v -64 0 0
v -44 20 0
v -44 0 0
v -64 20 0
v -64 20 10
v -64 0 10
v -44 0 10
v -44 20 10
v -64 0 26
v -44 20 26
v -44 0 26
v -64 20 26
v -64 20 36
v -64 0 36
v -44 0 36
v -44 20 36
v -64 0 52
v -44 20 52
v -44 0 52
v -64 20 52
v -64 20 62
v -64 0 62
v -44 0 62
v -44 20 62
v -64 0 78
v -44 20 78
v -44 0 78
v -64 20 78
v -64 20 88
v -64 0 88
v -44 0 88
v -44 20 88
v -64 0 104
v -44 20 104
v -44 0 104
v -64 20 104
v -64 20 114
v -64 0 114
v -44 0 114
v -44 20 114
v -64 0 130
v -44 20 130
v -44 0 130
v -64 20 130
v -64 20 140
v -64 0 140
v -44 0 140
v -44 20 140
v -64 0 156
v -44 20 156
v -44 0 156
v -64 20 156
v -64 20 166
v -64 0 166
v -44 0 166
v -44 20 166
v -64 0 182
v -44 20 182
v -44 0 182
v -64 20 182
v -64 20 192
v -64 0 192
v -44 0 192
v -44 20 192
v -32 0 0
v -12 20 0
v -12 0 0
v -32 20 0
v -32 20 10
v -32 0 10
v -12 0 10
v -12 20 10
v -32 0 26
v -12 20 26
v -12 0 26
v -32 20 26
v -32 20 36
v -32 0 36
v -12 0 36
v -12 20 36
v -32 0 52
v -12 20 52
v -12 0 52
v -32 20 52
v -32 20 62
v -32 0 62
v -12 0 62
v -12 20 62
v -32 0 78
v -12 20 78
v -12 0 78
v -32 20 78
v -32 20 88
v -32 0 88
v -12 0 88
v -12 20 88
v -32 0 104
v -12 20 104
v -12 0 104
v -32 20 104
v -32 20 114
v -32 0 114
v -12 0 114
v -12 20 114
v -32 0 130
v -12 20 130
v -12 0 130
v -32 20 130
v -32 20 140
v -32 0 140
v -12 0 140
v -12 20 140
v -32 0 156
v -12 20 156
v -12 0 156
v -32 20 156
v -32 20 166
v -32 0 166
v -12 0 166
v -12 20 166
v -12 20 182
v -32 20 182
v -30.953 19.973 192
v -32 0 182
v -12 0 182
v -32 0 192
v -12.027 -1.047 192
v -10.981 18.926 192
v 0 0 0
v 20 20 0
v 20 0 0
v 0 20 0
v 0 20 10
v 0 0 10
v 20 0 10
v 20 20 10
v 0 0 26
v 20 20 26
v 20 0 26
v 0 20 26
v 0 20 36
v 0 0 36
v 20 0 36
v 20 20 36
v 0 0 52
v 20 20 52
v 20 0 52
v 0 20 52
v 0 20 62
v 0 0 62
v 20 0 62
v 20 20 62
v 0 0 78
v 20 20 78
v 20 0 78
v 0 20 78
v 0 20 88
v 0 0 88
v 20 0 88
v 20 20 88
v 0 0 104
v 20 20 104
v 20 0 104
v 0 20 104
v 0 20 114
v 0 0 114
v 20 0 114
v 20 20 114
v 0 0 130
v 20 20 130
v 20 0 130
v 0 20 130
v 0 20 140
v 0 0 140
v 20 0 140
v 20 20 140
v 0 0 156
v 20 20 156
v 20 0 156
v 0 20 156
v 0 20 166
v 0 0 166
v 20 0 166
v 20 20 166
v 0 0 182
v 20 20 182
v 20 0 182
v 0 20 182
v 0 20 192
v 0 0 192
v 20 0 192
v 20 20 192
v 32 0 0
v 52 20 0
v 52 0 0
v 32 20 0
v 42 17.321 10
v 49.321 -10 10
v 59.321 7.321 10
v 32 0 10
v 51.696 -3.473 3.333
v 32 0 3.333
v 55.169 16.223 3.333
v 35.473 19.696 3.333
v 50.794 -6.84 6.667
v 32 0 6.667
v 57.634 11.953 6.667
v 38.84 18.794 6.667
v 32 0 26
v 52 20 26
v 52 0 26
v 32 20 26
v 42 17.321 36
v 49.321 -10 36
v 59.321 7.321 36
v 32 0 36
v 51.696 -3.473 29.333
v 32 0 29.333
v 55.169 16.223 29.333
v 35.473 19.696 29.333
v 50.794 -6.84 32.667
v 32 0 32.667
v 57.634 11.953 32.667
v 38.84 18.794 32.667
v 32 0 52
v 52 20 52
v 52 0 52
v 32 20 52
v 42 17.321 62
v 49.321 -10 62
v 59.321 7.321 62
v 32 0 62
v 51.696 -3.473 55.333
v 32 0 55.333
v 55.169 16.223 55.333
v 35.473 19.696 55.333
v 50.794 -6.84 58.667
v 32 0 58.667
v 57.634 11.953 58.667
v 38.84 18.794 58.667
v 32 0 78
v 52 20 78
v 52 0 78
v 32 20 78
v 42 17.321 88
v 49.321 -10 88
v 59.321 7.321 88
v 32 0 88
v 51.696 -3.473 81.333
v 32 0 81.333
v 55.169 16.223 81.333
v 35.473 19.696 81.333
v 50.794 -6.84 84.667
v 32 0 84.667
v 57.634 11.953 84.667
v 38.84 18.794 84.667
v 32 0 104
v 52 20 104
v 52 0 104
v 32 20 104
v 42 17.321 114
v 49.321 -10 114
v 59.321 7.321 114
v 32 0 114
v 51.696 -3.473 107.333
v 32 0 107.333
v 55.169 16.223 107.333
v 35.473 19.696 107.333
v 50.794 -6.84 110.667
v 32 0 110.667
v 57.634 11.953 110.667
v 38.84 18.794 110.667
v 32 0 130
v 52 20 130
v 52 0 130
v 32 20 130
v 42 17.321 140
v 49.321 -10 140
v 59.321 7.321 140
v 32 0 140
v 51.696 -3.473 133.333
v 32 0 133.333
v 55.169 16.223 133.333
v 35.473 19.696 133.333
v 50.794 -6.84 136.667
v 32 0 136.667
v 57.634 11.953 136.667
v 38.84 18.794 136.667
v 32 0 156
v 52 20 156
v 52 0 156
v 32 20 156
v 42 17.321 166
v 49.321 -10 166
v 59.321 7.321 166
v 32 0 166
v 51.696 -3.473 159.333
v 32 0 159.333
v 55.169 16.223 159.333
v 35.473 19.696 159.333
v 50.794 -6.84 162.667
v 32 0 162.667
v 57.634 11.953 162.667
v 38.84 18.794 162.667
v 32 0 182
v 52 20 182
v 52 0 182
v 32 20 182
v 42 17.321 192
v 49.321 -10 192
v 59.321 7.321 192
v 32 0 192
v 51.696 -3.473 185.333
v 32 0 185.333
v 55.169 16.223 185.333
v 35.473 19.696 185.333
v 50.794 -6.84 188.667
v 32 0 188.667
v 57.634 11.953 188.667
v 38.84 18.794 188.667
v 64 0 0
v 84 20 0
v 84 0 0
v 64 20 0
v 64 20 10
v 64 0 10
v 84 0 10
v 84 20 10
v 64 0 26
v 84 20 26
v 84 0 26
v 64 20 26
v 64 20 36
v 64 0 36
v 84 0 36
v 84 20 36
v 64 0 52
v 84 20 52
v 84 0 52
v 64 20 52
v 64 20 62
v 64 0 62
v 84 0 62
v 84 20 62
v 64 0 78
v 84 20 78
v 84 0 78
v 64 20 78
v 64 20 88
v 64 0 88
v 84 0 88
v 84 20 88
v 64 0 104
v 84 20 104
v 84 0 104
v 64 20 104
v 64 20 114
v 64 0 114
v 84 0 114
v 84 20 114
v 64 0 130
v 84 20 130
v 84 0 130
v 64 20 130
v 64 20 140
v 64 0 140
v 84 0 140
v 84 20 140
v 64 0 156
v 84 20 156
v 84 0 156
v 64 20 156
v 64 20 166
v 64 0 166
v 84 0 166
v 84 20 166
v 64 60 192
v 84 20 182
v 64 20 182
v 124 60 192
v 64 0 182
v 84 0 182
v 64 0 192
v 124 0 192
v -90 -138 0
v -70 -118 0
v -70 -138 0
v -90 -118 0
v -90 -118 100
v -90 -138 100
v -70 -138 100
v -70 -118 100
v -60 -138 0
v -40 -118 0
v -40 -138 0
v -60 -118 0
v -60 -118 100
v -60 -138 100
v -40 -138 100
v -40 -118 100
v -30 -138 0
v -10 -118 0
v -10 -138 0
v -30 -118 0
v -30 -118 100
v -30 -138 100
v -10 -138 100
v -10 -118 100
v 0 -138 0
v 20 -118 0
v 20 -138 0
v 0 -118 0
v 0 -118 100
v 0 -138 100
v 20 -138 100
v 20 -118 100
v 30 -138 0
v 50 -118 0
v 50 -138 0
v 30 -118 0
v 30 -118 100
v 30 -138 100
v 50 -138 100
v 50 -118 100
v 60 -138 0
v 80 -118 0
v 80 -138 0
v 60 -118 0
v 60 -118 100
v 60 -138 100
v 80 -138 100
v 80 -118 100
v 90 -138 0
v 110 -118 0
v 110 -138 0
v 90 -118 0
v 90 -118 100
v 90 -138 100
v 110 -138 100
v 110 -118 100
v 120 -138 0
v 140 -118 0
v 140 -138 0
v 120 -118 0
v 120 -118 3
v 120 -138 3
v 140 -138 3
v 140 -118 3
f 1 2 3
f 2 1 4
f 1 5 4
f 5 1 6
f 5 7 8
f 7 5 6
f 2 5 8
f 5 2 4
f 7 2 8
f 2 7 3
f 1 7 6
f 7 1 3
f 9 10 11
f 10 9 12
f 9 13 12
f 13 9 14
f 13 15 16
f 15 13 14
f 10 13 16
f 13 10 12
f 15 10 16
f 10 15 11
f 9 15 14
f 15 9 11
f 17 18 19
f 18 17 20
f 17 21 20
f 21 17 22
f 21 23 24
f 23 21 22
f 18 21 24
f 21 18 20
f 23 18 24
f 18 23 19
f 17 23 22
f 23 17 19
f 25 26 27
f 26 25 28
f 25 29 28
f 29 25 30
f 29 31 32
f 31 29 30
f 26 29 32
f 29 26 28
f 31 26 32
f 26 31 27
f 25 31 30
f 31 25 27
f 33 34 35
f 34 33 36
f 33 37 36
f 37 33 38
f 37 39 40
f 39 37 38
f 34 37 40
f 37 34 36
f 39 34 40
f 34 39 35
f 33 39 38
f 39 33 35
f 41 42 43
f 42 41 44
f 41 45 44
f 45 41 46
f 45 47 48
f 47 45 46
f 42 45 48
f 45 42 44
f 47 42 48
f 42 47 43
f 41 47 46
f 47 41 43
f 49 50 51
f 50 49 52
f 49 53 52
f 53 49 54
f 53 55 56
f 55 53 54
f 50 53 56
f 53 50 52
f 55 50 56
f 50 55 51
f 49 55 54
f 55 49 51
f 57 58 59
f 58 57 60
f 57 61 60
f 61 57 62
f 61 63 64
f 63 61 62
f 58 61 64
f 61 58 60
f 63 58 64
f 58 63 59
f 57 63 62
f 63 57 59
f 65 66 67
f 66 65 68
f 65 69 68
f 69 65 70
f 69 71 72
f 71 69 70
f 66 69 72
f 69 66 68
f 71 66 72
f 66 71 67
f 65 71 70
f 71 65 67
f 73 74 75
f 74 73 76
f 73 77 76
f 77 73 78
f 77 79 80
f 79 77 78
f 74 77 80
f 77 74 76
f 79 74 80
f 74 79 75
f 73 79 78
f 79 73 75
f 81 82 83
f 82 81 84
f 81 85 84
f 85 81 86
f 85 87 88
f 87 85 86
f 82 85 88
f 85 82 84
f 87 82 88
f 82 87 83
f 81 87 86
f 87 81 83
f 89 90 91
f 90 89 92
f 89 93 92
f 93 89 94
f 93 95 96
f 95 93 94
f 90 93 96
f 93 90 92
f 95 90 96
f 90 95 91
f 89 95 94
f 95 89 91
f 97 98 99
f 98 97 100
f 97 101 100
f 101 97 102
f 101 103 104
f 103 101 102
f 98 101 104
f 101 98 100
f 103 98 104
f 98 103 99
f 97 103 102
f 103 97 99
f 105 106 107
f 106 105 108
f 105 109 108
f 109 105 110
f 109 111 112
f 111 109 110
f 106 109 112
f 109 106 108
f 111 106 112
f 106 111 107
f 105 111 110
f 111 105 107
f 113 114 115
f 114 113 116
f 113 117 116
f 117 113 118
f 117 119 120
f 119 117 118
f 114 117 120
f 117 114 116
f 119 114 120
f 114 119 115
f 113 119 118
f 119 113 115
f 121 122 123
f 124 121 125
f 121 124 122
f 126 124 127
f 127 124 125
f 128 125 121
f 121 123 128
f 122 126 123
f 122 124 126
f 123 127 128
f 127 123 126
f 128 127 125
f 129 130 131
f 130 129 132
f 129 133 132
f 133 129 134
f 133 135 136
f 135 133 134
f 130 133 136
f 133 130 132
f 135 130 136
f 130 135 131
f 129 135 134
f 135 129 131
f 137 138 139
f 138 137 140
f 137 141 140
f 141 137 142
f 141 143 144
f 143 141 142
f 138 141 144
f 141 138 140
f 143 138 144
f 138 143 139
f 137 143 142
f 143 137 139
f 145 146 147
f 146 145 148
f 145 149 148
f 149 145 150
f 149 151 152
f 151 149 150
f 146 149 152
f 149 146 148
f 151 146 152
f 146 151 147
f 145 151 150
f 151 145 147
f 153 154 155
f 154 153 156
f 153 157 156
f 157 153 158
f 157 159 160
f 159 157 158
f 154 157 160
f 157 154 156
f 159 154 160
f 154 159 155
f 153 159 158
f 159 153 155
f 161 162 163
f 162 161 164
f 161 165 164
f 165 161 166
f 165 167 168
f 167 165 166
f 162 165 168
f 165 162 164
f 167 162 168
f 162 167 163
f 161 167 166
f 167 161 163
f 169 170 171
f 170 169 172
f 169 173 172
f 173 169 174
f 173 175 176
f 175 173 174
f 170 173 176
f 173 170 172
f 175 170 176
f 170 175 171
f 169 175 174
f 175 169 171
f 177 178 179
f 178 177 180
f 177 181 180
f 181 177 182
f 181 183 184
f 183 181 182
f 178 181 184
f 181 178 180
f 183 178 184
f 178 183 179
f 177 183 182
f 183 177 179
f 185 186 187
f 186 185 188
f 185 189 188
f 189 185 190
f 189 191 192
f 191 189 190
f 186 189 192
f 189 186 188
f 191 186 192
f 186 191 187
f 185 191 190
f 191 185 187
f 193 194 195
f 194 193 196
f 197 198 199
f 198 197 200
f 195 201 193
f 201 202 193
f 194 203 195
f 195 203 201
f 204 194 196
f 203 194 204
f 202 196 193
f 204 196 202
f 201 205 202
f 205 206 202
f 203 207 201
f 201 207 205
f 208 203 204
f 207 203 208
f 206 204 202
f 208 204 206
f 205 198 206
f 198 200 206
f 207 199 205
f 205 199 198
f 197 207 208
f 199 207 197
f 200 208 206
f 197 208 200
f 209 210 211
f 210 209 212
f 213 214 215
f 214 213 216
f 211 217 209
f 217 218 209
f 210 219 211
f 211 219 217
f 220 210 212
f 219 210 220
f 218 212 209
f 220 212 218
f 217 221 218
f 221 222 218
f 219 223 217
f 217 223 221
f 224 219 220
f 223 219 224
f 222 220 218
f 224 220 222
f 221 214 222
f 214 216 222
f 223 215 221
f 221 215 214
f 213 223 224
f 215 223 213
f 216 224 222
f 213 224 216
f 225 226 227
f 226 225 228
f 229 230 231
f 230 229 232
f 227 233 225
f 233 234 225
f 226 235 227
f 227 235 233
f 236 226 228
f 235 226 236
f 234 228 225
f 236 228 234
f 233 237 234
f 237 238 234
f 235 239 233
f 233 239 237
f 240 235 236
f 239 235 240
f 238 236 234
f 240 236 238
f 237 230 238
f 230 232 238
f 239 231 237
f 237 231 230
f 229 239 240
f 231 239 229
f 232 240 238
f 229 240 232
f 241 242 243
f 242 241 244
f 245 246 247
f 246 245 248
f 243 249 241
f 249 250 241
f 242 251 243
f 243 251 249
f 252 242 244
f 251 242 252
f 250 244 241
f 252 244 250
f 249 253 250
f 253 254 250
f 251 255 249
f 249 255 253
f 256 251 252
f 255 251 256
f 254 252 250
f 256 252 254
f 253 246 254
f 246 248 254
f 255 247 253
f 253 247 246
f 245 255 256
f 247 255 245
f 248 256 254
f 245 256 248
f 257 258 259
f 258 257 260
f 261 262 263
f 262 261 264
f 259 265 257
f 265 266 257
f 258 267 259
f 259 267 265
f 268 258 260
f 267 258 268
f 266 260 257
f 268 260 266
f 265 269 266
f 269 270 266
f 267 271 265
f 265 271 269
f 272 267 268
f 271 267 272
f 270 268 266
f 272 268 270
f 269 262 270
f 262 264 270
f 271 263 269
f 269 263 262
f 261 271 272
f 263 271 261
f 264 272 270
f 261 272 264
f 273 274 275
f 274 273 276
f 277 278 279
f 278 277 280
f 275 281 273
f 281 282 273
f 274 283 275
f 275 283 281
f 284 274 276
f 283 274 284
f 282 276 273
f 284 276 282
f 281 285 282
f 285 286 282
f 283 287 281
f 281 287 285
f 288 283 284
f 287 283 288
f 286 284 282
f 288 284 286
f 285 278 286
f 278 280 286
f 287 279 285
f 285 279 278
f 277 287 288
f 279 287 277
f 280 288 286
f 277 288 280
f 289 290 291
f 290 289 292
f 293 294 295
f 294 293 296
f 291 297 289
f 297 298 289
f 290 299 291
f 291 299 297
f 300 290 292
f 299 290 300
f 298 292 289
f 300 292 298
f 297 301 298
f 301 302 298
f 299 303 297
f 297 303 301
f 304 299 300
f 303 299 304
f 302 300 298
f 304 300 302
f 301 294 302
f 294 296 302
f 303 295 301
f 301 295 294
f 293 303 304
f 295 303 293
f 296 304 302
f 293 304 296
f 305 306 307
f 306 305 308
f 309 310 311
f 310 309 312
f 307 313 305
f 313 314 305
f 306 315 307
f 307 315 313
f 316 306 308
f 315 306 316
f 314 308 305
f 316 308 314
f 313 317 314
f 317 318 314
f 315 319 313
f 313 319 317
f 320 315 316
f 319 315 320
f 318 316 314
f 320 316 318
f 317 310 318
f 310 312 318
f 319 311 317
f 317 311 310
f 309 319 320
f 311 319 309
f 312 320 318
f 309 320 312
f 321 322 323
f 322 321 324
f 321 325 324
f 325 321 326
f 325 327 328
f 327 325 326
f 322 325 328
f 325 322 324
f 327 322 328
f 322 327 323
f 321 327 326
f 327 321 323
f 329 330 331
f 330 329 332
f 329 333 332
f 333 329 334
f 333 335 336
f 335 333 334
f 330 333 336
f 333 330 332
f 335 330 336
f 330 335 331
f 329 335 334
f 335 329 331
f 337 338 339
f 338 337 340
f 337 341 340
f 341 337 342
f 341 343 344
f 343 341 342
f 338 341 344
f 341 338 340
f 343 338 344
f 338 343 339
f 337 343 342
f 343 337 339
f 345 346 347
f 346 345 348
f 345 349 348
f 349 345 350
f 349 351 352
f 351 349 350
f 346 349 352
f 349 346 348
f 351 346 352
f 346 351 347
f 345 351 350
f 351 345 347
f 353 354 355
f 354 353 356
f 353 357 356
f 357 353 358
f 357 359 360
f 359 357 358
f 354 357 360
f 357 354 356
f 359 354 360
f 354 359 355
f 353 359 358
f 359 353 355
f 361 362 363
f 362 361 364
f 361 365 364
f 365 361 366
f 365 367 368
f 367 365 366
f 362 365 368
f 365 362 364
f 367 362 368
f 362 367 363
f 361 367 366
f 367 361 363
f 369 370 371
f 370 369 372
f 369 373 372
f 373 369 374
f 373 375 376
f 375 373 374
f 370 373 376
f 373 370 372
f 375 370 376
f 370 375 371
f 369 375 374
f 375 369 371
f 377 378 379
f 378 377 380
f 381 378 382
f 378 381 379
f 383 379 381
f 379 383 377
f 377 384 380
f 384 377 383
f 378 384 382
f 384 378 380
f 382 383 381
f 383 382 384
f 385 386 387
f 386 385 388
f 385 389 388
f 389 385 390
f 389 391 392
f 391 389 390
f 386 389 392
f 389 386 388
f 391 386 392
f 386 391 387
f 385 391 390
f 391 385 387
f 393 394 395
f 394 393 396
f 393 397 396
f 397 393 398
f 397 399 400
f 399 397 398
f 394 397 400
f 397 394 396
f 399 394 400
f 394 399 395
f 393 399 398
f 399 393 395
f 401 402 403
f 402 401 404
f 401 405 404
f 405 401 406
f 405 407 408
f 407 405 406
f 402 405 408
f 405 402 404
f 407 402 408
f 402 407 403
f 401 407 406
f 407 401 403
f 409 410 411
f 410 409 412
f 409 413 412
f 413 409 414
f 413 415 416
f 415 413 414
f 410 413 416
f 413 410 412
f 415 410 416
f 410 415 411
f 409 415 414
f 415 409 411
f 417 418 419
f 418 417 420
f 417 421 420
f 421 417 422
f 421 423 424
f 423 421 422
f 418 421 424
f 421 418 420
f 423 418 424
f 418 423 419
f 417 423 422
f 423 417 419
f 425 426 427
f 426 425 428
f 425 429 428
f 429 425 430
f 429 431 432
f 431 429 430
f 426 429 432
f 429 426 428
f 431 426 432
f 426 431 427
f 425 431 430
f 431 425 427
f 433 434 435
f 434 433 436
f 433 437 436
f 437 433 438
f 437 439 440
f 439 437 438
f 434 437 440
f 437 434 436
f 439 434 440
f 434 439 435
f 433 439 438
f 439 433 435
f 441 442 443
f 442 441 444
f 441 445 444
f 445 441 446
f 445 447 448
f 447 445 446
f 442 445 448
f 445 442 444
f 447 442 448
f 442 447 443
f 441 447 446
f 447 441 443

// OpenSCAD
// Volume: 454644.0301245096, SurfaceArea: 134160.57550786296
// test cases for linear extrude with various (invalid) parameters
ox = 32;
oz = 26;
params = [ [0, undef], [1, 1/0], [2, -1/0], [3, 0/0], [4, ""], [5, true], [6, [1:3]], [7, 3] ];


for (a = params) translate([-2*ox, 0, oz * a[0]])
color("red") linear_extrude(height = 10, convexity = a[1]) square(20);

for (a = params) translate([-ox, 0, oz * a[0]])
color("yellow") linear_extrude(height = 10, convexity = undef, scale = 1, twist = a[1]) square(20);

for (a = params) translate([0, 0, oz * a[0]])
color("gray") linear_extrude(height = 10, convexity = undef, scale = 1, twist = 0, slices = a[1]) square(20);

// Test that when both height and h are specified there's a warning and height wins.
// Specify height first.
for (a = params) translate([ox, 0, oz * a[0]])
color("purple") linear_extrude(height = 10, h=27, convexity = undef, scale = 1, twist = 30, slices = a[1]) square(20);

// Test that when both height and h are specified there's a warning and height wins.
// Specify h first.
for (a = params) translate([2*ox, 0, oz * a[0]])
color("blue") linear_extrude(h=27, height = 10, convexity = 2, scale = a[1]) square(20);

for (a = params) translate([(a[0] - 3) * 30, -138, 0])
color("green") linear_extrude(height = a[1]) square(20);
